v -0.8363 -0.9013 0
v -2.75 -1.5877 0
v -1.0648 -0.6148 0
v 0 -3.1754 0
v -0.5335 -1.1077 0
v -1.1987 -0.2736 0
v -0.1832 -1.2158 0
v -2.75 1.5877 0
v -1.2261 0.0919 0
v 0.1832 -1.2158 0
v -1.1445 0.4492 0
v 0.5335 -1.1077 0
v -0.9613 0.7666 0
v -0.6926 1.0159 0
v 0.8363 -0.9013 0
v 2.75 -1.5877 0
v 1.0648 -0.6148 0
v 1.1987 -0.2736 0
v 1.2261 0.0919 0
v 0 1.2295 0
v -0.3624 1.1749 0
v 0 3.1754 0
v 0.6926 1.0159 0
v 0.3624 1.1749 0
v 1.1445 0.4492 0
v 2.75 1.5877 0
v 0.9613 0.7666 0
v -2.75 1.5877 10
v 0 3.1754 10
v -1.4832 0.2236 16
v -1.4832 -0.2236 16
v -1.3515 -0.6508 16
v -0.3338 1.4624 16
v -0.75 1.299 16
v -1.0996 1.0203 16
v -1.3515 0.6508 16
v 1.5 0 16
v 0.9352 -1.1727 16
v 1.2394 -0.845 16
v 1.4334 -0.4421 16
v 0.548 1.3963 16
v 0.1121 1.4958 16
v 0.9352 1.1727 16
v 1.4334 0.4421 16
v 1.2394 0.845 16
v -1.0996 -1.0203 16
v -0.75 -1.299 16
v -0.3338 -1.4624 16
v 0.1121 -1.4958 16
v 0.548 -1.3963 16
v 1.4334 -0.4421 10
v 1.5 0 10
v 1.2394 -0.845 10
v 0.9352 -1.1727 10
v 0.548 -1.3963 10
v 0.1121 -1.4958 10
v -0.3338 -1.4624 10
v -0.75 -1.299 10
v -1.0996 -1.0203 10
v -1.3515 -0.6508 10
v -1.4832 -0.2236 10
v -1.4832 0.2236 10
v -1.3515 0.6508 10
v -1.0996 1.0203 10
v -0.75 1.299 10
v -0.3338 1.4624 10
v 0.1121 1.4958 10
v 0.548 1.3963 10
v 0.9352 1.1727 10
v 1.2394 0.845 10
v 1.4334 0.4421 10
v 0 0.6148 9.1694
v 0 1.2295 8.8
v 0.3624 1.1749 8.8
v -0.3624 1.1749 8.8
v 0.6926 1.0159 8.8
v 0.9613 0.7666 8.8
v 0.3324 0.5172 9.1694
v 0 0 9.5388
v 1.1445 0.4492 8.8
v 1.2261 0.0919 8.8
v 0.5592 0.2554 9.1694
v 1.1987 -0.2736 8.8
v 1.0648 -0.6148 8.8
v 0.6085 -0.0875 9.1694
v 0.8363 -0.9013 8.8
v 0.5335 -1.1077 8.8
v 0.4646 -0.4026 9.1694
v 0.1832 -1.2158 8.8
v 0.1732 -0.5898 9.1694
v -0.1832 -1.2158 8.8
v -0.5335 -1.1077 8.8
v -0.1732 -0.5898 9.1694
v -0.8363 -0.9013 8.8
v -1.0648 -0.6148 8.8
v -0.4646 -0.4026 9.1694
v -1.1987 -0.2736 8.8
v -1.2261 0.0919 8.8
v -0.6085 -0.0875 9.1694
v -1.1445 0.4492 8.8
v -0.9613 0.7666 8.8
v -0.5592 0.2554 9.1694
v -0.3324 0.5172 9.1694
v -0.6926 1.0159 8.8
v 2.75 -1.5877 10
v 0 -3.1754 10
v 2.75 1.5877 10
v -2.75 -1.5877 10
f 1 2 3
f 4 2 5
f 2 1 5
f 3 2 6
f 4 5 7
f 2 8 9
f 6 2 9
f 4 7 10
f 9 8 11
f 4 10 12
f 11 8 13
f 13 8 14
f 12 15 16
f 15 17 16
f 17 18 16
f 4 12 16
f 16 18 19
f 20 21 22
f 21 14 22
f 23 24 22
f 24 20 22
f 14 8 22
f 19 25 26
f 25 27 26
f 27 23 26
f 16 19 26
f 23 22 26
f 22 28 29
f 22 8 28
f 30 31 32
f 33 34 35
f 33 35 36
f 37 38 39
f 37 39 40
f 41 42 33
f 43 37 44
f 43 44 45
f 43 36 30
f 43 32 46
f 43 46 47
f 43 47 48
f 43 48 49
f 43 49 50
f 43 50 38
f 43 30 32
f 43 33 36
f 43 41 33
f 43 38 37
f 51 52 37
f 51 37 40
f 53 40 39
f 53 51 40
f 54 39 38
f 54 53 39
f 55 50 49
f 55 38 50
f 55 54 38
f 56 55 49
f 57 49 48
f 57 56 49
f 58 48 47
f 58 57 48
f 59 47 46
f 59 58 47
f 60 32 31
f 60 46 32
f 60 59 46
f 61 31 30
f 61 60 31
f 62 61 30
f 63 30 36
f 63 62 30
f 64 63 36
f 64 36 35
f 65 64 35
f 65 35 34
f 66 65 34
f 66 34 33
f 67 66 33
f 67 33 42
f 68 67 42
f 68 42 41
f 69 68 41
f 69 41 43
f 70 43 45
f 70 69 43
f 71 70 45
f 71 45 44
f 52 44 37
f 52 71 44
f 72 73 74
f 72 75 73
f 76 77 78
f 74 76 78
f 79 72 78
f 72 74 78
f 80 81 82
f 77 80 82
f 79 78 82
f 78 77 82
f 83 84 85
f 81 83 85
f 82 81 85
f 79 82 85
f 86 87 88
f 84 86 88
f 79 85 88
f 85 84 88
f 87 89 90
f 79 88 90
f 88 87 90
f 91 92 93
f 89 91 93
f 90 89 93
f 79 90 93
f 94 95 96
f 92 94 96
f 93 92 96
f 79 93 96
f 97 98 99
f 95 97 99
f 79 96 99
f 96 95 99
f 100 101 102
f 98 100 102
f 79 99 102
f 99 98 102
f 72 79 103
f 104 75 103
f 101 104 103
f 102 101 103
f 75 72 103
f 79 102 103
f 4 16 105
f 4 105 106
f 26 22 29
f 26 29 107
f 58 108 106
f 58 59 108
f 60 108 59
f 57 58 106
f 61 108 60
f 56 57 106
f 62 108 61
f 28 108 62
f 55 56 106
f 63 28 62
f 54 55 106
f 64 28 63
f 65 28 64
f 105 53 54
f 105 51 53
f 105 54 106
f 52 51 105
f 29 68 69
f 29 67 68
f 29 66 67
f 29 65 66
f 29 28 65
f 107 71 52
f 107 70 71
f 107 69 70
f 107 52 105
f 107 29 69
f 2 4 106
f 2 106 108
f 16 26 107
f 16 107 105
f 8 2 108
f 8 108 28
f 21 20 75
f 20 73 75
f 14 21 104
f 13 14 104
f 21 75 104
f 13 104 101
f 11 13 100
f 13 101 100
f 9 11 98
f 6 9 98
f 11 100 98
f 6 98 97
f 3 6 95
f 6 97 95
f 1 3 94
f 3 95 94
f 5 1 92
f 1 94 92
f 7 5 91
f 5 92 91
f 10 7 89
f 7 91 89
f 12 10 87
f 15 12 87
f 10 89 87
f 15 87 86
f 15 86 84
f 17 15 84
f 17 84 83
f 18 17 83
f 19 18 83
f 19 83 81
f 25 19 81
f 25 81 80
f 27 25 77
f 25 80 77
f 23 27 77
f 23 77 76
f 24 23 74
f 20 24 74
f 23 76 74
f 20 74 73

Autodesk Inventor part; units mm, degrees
ref_plane "YZ Plane" through (0, 0, 0) normal (1, 0, 0) x (0, 1, 0)
ref_plane "XZ Plane" through (0, 0, 0) normal (0, 1, 0) x (-1, 0, 0)
ref_plane "XY Plane" through (0, 0, 0) normal (0, 0, 1) x (1, 0, 0)
sketch "スケッチ1" plane through (0, 0, 0) normal (0, 0, 1) x (1, 0, 0)
  line L0 (0, 3.1754) -> (2.75, 1.5877)
  line L1 (2.75, 1.5877) -> (2.75, -1.5877)
  line L2 (2.75, -1.5877) -> (0, -3.1754)
  line L3 (0, -3.1754) -> (-2.75, -1.5877)
  line L4 (-2.75, -1.5877) -> (-2.75, 1.5877)
  line L5 (-2.75, 1.5877) -> (0, 3.1754)
  point P0 (0, 0)
  point P1 (0, 0)
  dimension "d0" = 5.5
extrude "押し出し1" add sketch "スケッチ1" along normal blind 10
sketch "スケッチ2" plane through (0, 0, 10) normal (0, 0, 1) x (1, 0, 0)
  circle A0 centre (0, 0) radius 1.5
  dimension "d3" = 3
extrude "押し出し2" add sketch "スケッチ2" along normal blind 6
thread "ねじ1" size "M3x0.5" class "6g" standard "ANSI Metric M Profile" full length
sketch "スケッチ3" plane through (0, 0, 0) normal (0, 0, -1) x (-1, 0, 0)
  point P0 (0, 0)
hole "穴1" at (0, 0, 0) direction (0, 0, 1) diameter 2.459 depth 8.8 tip angle 118 thread size "M3x0.5" class "6H" standard "ISO Metric profile"
properties part number "ステンレススペーサー（六角）_BSU-310" material "ステンレス鋼"
